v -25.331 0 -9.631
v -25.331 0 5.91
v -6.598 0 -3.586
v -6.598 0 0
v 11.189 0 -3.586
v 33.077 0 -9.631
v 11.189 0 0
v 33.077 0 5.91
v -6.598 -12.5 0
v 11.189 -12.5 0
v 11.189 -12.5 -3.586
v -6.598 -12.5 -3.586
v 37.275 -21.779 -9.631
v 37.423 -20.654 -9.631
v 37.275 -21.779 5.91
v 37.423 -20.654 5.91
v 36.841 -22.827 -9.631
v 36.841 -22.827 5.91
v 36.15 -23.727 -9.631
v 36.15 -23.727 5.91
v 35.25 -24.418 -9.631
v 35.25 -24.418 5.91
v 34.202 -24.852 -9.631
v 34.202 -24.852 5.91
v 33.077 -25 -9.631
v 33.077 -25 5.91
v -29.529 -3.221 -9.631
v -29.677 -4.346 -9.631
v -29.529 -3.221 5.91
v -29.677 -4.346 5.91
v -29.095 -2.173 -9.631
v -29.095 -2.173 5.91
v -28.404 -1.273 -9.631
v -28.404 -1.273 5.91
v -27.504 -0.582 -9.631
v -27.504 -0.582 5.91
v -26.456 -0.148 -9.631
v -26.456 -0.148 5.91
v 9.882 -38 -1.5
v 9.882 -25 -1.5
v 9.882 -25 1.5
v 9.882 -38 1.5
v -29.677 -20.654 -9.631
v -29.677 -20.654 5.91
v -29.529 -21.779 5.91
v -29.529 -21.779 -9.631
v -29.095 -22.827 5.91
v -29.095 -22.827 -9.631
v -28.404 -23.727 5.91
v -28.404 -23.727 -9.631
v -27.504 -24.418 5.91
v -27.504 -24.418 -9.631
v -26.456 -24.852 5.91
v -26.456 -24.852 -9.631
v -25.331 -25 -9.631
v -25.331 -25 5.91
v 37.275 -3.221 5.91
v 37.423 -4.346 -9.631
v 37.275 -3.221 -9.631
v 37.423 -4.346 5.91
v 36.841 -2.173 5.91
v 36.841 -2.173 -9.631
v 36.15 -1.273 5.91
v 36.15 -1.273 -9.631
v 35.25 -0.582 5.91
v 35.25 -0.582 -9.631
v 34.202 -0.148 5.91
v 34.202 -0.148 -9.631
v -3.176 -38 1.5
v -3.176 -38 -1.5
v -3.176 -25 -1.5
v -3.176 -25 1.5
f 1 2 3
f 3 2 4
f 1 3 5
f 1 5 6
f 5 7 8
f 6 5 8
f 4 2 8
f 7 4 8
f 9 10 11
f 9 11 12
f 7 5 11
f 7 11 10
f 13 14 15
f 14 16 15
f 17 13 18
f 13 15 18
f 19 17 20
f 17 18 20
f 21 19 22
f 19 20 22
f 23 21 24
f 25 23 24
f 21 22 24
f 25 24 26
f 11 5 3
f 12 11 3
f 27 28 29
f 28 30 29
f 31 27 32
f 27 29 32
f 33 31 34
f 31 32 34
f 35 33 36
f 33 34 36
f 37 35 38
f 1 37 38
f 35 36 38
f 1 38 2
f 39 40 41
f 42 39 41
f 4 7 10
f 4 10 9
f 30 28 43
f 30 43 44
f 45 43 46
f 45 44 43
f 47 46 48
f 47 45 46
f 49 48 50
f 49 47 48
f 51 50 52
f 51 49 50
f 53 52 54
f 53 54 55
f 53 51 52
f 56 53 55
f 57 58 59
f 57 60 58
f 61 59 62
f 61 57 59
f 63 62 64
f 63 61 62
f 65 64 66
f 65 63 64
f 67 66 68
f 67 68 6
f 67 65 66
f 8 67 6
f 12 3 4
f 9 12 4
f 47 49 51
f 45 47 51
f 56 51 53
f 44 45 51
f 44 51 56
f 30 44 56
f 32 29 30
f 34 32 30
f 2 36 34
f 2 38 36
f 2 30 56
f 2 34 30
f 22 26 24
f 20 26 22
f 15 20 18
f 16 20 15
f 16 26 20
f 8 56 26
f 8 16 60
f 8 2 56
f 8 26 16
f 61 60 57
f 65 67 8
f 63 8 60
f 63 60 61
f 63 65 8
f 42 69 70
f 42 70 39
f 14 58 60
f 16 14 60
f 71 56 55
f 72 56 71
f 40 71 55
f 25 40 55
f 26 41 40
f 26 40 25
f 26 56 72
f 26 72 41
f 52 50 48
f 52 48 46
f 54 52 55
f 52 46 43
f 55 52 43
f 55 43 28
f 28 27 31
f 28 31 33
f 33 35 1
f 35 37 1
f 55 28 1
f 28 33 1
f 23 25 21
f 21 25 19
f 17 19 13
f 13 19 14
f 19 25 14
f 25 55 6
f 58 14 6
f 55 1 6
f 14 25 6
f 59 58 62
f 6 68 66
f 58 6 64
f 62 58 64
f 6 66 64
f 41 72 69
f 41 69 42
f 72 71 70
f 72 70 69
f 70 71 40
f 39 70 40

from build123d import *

# Parameters (mm, degrees)
F0_W     = 67.1
F0_H     = 15.54066
F1_DEPTH = 25
F2_R     = 4.345584
F3_W     = 13.058827
F3_H     = 3
F4_DEPTH = 13
F5_W     = 17.786888
F5_H     = 3.586066
F6_DEPTH = 12.5


with BuildPart() as f1:
    # F0 (on Front) → F1 (new body)
    with BuildSketch(Plane.XZ):
        with Locations((3.872952, -1.860657)):
            Rectangle(F0_W, F0_H)
    extrude(amount=F1_DEPTH)

    # F2
    f2_edges = [f1.edges().sort_by_distance(p)[0] for p in [
        (37.422952, 0, -1.860657),
        (-29.677048, 0, -1.860657),
        (37.422952, -25, -1.860657),
        (-29.677048, -25, -1.860657),
    ]]
    fillet(f2_edges, radius=F2_R)

    # F3 (on face) → F4 (join)
    with BuildSketch(Plane.XZ.offset(25)):
        with Locations((3.352943, 0)):
            Rectangle(F3_W, F3_H)
    extrude(amount=F4_DEPTH)

    # F5 (on face) → F6 (cut, symmetric)
    with BuildSketch(Plane(origin=(0, 0, 0), x_dir=(-1, 0, 0), z_dir=(0, 1, 0))):
        with Locations((-2.295081, -1.793033)):
            Rectangle(F5_W, F5_H)
    extrude(amount=F6_DEPTH, both=True, mode=Mode.SUBTRACT)


solid = f1.part
